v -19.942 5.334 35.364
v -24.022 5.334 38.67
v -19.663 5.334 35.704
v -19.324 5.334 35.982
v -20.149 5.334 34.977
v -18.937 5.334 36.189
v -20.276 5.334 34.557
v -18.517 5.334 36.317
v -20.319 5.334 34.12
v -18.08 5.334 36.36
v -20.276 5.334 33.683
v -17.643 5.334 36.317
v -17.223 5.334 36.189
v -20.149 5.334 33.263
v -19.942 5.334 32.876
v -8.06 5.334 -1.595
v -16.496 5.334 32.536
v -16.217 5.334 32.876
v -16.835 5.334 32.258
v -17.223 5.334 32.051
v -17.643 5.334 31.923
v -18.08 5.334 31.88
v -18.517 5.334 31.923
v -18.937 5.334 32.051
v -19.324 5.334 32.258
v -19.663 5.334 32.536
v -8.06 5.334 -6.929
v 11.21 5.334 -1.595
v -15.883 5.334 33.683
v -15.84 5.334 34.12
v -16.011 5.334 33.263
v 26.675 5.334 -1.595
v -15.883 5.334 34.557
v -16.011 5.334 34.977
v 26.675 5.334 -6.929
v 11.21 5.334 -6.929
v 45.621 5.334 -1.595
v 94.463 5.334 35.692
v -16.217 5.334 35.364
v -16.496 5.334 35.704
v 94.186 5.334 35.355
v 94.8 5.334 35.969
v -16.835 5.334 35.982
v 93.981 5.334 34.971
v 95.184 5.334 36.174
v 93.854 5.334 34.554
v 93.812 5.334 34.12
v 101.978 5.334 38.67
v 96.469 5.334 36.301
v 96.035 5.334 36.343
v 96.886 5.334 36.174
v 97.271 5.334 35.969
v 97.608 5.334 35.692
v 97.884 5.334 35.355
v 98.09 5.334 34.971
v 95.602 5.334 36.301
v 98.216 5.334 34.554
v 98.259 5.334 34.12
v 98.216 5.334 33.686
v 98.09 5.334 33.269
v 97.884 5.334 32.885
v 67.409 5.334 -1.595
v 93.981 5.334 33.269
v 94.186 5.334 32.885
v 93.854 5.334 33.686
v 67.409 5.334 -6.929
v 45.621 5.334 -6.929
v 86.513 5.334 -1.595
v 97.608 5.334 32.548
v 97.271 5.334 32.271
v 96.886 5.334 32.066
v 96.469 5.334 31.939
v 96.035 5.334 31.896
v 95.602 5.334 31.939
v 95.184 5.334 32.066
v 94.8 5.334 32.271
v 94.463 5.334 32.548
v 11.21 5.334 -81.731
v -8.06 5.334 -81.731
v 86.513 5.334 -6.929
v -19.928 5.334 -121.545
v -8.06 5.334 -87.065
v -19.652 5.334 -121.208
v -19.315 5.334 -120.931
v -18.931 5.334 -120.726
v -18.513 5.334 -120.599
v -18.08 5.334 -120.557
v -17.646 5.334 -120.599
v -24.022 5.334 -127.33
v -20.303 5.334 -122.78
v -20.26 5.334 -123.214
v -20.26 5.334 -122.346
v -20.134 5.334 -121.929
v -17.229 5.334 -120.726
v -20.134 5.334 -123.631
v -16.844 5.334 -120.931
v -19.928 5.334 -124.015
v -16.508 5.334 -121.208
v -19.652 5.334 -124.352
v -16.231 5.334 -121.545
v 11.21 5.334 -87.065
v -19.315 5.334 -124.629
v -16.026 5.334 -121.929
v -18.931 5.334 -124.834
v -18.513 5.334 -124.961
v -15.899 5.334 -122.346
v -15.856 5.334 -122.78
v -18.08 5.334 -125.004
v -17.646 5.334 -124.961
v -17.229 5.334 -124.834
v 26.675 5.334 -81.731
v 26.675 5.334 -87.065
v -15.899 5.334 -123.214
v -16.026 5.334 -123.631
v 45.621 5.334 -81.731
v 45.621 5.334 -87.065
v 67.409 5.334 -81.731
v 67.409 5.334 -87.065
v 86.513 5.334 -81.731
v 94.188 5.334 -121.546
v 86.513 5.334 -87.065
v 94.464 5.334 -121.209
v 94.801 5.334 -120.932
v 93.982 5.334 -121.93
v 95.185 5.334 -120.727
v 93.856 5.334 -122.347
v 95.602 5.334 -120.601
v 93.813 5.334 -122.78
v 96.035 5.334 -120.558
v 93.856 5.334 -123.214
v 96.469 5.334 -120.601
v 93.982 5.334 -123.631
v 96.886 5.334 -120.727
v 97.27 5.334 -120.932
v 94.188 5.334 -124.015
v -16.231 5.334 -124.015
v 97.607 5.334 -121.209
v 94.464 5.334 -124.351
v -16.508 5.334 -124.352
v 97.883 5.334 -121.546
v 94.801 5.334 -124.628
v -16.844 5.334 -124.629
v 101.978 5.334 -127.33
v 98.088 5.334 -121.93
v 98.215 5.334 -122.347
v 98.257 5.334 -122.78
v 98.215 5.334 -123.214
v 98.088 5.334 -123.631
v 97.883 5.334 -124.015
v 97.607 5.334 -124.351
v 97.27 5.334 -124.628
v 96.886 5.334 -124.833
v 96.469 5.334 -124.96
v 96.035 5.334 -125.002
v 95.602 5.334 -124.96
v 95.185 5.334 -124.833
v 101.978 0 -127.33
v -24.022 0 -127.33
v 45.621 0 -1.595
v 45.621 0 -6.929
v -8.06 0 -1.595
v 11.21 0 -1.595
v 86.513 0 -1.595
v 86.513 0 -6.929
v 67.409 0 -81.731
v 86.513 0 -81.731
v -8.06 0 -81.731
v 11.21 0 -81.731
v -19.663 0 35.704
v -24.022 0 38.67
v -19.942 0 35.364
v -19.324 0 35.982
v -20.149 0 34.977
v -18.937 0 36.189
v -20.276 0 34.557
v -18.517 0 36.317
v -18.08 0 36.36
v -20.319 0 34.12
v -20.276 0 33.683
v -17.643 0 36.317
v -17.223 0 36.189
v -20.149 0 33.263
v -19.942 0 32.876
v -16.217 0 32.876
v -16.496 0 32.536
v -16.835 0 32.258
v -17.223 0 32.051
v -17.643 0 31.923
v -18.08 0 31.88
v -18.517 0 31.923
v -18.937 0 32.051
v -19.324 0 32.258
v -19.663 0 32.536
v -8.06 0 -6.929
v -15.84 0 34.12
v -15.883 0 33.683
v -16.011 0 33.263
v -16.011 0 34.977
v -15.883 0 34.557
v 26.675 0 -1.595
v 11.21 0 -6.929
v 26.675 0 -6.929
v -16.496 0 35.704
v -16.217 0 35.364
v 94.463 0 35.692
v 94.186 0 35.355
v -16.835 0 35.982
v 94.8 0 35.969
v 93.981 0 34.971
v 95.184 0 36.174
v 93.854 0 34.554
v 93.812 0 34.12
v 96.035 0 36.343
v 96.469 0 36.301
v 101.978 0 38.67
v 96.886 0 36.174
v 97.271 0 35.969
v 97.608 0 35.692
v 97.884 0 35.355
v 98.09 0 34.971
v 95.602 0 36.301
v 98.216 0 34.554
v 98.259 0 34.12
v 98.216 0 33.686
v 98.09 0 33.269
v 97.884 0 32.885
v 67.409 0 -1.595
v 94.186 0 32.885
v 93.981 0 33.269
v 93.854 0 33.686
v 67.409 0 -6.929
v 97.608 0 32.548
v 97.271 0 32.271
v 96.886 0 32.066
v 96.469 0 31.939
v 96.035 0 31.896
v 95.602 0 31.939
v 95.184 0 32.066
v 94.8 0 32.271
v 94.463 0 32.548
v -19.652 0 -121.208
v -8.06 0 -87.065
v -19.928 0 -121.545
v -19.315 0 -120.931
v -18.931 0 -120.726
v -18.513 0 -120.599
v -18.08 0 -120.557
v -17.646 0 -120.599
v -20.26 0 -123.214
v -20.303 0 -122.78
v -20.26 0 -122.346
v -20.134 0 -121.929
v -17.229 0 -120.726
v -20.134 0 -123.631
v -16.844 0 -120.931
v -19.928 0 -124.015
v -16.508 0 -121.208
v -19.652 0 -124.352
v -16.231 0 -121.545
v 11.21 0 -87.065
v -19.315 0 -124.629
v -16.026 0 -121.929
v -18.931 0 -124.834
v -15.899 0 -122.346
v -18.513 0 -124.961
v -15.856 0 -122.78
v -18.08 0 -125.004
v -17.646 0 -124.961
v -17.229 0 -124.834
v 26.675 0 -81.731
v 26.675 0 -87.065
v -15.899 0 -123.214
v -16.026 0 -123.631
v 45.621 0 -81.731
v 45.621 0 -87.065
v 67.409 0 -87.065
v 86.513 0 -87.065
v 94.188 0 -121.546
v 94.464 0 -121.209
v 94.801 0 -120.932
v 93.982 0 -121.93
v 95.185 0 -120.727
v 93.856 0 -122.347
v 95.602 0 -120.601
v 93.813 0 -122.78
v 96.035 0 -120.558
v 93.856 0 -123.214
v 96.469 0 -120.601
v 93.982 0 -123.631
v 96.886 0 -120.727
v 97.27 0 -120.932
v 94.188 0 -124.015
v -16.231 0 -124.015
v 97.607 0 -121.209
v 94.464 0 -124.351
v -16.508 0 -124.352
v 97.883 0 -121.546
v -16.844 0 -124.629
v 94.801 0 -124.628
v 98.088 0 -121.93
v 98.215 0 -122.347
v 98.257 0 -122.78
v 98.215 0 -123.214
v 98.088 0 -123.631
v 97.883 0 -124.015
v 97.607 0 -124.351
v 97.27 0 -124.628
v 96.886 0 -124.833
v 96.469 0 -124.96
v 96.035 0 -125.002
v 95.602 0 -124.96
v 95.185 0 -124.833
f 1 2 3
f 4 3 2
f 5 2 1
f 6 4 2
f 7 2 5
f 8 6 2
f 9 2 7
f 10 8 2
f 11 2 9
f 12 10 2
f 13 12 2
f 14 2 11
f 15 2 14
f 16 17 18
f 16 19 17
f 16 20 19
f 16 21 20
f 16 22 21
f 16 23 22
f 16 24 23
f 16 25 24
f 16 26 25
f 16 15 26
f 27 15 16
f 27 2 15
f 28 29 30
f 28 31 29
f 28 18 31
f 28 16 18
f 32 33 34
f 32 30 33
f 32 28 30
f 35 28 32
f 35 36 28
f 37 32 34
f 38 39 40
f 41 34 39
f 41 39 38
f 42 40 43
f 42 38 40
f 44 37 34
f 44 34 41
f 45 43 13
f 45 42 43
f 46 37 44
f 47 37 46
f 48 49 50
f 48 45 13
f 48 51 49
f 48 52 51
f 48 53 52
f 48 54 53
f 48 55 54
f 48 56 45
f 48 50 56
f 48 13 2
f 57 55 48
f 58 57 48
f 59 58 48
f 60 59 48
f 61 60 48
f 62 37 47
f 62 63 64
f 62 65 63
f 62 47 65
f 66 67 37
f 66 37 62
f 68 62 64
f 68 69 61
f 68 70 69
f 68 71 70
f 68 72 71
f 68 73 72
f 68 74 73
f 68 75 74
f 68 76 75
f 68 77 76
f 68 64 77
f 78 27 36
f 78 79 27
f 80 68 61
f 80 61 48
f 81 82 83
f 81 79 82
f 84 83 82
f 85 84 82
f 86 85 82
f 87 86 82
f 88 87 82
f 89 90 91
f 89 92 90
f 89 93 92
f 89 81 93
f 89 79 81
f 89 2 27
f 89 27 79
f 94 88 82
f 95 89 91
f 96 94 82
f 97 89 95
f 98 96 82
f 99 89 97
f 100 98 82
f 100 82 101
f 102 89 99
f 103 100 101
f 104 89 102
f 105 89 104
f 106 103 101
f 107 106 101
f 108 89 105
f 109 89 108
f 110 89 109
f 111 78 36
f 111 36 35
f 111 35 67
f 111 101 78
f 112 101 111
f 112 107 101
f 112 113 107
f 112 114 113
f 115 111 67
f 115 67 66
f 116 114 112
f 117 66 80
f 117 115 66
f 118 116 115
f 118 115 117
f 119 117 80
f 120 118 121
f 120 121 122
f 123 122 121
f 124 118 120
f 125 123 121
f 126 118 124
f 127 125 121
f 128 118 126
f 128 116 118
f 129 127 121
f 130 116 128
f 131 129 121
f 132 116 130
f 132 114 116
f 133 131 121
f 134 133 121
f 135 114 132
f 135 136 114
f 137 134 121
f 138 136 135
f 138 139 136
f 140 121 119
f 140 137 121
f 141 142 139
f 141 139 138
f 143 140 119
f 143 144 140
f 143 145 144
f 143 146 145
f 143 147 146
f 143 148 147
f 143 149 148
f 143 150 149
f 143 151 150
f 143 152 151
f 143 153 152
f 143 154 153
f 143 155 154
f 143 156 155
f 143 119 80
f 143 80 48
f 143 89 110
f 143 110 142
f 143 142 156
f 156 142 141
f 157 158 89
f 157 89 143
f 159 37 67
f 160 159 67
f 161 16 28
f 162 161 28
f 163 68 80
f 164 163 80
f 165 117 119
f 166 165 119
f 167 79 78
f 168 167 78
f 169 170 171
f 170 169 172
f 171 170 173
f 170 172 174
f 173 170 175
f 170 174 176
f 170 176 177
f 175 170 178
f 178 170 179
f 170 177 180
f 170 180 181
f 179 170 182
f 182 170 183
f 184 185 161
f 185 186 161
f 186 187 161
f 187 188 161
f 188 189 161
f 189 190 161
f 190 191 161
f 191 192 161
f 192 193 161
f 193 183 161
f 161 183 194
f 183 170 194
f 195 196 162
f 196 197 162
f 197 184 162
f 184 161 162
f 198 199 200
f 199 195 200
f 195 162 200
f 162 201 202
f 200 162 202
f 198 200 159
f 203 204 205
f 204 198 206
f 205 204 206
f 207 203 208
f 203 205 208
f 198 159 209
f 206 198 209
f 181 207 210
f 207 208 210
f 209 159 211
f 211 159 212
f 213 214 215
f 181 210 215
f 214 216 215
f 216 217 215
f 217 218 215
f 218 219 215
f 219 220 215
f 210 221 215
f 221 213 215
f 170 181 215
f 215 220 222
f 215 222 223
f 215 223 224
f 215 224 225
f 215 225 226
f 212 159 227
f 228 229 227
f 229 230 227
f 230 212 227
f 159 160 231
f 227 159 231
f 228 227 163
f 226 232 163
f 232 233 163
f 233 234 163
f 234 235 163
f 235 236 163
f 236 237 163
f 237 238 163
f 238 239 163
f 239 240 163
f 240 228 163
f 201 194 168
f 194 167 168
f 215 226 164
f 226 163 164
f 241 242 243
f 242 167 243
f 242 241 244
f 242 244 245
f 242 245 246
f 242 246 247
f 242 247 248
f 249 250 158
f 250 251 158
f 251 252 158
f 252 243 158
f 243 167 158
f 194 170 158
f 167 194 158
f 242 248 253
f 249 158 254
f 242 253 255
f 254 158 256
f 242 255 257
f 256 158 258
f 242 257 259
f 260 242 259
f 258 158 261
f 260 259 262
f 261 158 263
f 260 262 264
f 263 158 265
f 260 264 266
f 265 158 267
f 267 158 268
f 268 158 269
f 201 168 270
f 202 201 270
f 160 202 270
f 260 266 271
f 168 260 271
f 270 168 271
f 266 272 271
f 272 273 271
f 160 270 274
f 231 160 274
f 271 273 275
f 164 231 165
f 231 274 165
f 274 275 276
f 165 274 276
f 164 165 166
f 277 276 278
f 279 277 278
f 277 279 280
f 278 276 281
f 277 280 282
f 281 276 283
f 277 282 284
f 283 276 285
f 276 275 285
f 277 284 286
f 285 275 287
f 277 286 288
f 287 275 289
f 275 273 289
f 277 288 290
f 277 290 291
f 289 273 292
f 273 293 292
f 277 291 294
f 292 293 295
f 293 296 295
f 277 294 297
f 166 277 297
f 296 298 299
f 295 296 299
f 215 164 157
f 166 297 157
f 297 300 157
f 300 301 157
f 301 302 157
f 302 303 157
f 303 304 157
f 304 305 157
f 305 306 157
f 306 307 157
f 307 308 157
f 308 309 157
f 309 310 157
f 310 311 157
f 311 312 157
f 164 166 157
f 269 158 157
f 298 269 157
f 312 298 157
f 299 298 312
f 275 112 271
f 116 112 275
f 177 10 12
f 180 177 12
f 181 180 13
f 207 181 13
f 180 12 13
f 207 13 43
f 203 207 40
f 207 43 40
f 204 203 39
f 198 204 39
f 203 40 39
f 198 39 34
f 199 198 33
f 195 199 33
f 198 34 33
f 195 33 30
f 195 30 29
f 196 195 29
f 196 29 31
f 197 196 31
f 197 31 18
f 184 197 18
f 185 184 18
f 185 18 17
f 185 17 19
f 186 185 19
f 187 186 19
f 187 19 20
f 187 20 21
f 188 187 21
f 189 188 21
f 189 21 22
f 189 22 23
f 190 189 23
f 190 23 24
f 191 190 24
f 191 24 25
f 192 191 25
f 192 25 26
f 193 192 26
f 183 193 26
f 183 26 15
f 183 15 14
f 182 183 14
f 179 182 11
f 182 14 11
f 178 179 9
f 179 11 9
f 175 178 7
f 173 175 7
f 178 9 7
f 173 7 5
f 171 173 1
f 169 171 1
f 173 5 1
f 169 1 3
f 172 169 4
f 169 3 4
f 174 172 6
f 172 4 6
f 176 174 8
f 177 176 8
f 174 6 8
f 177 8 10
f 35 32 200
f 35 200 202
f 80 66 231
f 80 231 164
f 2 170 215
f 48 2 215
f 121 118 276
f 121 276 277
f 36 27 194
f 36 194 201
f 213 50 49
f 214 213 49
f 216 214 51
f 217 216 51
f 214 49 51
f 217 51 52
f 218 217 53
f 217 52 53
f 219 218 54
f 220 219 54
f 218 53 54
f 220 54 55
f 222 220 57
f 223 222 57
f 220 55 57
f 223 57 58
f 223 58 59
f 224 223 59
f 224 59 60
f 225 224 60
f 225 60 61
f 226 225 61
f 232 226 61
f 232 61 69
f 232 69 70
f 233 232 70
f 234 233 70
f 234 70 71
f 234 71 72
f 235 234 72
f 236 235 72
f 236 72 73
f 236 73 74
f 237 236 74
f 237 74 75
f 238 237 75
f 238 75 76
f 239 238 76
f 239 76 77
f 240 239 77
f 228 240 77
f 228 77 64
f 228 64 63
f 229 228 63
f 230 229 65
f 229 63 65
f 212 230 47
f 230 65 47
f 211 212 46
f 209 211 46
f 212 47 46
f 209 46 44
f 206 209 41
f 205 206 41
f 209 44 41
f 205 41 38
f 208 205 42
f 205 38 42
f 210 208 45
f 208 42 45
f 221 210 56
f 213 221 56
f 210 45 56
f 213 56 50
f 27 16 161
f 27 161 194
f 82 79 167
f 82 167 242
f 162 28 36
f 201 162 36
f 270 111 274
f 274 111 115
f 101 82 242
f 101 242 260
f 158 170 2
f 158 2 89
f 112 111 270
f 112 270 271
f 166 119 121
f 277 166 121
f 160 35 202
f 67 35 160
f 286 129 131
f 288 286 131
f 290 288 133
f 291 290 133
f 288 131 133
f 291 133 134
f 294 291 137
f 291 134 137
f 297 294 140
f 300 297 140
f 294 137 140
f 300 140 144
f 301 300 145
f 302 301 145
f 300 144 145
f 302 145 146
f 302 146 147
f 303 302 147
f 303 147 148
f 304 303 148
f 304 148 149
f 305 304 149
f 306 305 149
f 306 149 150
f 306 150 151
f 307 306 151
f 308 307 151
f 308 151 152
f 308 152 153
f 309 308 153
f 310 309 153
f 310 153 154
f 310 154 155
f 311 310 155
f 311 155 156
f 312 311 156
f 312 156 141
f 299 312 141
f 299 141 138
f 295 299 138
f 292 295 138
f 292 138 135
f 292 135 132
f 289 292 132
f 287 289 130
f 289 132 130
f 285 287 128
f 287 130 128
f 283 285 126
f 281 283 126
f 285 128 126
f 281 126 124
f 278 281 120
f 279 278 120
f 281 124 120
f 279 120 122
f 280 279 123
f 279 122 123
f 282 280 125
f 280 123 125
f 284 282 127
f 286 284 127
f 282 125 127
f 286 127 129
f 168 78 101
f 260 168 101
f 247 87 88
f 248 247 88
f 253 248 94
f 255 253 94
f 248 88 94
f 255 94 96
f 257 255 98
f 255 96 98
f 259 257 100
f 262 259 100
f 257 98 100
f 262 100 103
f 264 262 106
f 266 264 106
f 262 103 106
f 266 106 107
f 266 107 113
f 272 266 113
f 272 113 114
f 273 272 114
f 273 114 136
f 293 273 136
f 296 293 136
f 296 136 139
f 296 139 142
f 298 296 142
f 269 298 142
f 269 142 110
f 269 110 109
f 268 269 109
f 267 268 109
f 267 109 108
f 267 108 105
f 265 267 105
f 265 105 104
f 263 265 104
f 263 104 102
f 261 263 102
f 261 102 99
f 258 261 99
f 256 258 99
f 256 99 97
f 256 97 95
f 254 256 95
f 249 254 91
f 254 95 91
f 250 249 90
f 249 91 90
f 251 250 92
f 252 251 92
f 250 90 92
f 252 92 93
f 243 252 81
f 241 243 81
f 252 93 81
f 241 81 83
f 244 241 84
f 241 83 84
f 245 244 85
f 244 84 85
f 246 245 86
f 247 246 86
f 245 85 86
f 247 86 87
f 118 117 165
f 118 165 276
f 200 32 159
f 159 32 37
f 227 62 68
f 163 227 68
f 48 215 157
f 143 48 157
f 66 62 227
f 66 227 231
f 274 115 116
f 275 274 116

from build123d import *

# Parameters (mm, degrees)
SKETCH1_W           = 125.999999968
SKETCH1_H           = 165.999999978
BOSS_EXTRUDE1_DEPTH = 5.334
SKETCH9_W           = 19.270046927
SKETCH9_H           = 5.334
SKETCH9_W_2         = 18.946166646
SKETCH9_W_3         = 19.104051368
CUT_EXTRUDE1_DEPTH  = 164.220324554
SKETCH10_R          = 2.223521257
SKETCH10_R_2        = 2.222212396
SKETCH10_R_3        = 2.223409271
SKETCH10_R_4        = 2.239695252
CUT_EXTRUDE2_DEPTH  = 164.220324554


with BuildPart() as part:
    # Sketch1 → Boss-Extrude1 (new body)
    with BuildSketch(Plane(origin=(0, 0, 0), x_dir=(1, 0, 0), z_dir=(0, 1, 0))):
        with Locations((38.977787599, 44.330097126)):
            Rectangle(SKETCH1_W, SKETCH1_H)
    extrude(amount=BOSS_EXTRUDE1_DEPTH)

    # Sketch9 → Cut-Extrude1 (cut, through all)
    with BuildSketch(Plane(origin=(0, 5.334, 0), x_dir=(1, 0, 0), z_dir=(0, 1, 0))):
        with Locations((1.575384394, 84.398171813)):
            Rectangle(SKETCH9_W, SKETCH9_H)
        with Locations((36.148083105, 84.398171813)):
            Rectangle(SKETCH9_W_2, SKETCH9_H)
        with Locations((76.961283755, 84.398171813)):
            Rectangle(SKETCH9_W_3, SKETCH9_H)
        with Locations((76.961283755, 4.262022439)):
            Rectangle(SKETCH9_W_3, SKETCH9_H)
        with Locations((36.148083105, 4.262022439)):
            Rectangle(SKETCH9_W_2, SKETCH9_H)
        with Locations((1.575384394, 4.262022439)):
            Rectangle(SKETCH9_W, SKETCH9_H)
    extrude(amount=-CUT_EXTRUDE1_DEPTH, mode=Mode.SUBTRACT)

    # Sketch10 → Cut-Extrude2 (cut, through all)
    with BuildSketch(Plane(origin=(0, 5.334, 0), x_dir=(1, 0, 0), z_dir=(0, 1, 0))):
        with Locations((96.035287599, -34.119902874)):
            Circle(SKETCH10_R)
        with Locations((96.035287599, 122.780097126)):
            Circle(SKETCH10_R_2)
        with Locations((-18.079712401, 122.780097126)):
            Circle(SKETCH10_R_3)
        with Locations((-18.079712401, -34.119902874)):
            Circle(SKETCH10_R_4)
    extrude(amount=-CUT_EXTRUDE2_DEPTH, mode=Mode.SUBTRACT)


solid = part.part
